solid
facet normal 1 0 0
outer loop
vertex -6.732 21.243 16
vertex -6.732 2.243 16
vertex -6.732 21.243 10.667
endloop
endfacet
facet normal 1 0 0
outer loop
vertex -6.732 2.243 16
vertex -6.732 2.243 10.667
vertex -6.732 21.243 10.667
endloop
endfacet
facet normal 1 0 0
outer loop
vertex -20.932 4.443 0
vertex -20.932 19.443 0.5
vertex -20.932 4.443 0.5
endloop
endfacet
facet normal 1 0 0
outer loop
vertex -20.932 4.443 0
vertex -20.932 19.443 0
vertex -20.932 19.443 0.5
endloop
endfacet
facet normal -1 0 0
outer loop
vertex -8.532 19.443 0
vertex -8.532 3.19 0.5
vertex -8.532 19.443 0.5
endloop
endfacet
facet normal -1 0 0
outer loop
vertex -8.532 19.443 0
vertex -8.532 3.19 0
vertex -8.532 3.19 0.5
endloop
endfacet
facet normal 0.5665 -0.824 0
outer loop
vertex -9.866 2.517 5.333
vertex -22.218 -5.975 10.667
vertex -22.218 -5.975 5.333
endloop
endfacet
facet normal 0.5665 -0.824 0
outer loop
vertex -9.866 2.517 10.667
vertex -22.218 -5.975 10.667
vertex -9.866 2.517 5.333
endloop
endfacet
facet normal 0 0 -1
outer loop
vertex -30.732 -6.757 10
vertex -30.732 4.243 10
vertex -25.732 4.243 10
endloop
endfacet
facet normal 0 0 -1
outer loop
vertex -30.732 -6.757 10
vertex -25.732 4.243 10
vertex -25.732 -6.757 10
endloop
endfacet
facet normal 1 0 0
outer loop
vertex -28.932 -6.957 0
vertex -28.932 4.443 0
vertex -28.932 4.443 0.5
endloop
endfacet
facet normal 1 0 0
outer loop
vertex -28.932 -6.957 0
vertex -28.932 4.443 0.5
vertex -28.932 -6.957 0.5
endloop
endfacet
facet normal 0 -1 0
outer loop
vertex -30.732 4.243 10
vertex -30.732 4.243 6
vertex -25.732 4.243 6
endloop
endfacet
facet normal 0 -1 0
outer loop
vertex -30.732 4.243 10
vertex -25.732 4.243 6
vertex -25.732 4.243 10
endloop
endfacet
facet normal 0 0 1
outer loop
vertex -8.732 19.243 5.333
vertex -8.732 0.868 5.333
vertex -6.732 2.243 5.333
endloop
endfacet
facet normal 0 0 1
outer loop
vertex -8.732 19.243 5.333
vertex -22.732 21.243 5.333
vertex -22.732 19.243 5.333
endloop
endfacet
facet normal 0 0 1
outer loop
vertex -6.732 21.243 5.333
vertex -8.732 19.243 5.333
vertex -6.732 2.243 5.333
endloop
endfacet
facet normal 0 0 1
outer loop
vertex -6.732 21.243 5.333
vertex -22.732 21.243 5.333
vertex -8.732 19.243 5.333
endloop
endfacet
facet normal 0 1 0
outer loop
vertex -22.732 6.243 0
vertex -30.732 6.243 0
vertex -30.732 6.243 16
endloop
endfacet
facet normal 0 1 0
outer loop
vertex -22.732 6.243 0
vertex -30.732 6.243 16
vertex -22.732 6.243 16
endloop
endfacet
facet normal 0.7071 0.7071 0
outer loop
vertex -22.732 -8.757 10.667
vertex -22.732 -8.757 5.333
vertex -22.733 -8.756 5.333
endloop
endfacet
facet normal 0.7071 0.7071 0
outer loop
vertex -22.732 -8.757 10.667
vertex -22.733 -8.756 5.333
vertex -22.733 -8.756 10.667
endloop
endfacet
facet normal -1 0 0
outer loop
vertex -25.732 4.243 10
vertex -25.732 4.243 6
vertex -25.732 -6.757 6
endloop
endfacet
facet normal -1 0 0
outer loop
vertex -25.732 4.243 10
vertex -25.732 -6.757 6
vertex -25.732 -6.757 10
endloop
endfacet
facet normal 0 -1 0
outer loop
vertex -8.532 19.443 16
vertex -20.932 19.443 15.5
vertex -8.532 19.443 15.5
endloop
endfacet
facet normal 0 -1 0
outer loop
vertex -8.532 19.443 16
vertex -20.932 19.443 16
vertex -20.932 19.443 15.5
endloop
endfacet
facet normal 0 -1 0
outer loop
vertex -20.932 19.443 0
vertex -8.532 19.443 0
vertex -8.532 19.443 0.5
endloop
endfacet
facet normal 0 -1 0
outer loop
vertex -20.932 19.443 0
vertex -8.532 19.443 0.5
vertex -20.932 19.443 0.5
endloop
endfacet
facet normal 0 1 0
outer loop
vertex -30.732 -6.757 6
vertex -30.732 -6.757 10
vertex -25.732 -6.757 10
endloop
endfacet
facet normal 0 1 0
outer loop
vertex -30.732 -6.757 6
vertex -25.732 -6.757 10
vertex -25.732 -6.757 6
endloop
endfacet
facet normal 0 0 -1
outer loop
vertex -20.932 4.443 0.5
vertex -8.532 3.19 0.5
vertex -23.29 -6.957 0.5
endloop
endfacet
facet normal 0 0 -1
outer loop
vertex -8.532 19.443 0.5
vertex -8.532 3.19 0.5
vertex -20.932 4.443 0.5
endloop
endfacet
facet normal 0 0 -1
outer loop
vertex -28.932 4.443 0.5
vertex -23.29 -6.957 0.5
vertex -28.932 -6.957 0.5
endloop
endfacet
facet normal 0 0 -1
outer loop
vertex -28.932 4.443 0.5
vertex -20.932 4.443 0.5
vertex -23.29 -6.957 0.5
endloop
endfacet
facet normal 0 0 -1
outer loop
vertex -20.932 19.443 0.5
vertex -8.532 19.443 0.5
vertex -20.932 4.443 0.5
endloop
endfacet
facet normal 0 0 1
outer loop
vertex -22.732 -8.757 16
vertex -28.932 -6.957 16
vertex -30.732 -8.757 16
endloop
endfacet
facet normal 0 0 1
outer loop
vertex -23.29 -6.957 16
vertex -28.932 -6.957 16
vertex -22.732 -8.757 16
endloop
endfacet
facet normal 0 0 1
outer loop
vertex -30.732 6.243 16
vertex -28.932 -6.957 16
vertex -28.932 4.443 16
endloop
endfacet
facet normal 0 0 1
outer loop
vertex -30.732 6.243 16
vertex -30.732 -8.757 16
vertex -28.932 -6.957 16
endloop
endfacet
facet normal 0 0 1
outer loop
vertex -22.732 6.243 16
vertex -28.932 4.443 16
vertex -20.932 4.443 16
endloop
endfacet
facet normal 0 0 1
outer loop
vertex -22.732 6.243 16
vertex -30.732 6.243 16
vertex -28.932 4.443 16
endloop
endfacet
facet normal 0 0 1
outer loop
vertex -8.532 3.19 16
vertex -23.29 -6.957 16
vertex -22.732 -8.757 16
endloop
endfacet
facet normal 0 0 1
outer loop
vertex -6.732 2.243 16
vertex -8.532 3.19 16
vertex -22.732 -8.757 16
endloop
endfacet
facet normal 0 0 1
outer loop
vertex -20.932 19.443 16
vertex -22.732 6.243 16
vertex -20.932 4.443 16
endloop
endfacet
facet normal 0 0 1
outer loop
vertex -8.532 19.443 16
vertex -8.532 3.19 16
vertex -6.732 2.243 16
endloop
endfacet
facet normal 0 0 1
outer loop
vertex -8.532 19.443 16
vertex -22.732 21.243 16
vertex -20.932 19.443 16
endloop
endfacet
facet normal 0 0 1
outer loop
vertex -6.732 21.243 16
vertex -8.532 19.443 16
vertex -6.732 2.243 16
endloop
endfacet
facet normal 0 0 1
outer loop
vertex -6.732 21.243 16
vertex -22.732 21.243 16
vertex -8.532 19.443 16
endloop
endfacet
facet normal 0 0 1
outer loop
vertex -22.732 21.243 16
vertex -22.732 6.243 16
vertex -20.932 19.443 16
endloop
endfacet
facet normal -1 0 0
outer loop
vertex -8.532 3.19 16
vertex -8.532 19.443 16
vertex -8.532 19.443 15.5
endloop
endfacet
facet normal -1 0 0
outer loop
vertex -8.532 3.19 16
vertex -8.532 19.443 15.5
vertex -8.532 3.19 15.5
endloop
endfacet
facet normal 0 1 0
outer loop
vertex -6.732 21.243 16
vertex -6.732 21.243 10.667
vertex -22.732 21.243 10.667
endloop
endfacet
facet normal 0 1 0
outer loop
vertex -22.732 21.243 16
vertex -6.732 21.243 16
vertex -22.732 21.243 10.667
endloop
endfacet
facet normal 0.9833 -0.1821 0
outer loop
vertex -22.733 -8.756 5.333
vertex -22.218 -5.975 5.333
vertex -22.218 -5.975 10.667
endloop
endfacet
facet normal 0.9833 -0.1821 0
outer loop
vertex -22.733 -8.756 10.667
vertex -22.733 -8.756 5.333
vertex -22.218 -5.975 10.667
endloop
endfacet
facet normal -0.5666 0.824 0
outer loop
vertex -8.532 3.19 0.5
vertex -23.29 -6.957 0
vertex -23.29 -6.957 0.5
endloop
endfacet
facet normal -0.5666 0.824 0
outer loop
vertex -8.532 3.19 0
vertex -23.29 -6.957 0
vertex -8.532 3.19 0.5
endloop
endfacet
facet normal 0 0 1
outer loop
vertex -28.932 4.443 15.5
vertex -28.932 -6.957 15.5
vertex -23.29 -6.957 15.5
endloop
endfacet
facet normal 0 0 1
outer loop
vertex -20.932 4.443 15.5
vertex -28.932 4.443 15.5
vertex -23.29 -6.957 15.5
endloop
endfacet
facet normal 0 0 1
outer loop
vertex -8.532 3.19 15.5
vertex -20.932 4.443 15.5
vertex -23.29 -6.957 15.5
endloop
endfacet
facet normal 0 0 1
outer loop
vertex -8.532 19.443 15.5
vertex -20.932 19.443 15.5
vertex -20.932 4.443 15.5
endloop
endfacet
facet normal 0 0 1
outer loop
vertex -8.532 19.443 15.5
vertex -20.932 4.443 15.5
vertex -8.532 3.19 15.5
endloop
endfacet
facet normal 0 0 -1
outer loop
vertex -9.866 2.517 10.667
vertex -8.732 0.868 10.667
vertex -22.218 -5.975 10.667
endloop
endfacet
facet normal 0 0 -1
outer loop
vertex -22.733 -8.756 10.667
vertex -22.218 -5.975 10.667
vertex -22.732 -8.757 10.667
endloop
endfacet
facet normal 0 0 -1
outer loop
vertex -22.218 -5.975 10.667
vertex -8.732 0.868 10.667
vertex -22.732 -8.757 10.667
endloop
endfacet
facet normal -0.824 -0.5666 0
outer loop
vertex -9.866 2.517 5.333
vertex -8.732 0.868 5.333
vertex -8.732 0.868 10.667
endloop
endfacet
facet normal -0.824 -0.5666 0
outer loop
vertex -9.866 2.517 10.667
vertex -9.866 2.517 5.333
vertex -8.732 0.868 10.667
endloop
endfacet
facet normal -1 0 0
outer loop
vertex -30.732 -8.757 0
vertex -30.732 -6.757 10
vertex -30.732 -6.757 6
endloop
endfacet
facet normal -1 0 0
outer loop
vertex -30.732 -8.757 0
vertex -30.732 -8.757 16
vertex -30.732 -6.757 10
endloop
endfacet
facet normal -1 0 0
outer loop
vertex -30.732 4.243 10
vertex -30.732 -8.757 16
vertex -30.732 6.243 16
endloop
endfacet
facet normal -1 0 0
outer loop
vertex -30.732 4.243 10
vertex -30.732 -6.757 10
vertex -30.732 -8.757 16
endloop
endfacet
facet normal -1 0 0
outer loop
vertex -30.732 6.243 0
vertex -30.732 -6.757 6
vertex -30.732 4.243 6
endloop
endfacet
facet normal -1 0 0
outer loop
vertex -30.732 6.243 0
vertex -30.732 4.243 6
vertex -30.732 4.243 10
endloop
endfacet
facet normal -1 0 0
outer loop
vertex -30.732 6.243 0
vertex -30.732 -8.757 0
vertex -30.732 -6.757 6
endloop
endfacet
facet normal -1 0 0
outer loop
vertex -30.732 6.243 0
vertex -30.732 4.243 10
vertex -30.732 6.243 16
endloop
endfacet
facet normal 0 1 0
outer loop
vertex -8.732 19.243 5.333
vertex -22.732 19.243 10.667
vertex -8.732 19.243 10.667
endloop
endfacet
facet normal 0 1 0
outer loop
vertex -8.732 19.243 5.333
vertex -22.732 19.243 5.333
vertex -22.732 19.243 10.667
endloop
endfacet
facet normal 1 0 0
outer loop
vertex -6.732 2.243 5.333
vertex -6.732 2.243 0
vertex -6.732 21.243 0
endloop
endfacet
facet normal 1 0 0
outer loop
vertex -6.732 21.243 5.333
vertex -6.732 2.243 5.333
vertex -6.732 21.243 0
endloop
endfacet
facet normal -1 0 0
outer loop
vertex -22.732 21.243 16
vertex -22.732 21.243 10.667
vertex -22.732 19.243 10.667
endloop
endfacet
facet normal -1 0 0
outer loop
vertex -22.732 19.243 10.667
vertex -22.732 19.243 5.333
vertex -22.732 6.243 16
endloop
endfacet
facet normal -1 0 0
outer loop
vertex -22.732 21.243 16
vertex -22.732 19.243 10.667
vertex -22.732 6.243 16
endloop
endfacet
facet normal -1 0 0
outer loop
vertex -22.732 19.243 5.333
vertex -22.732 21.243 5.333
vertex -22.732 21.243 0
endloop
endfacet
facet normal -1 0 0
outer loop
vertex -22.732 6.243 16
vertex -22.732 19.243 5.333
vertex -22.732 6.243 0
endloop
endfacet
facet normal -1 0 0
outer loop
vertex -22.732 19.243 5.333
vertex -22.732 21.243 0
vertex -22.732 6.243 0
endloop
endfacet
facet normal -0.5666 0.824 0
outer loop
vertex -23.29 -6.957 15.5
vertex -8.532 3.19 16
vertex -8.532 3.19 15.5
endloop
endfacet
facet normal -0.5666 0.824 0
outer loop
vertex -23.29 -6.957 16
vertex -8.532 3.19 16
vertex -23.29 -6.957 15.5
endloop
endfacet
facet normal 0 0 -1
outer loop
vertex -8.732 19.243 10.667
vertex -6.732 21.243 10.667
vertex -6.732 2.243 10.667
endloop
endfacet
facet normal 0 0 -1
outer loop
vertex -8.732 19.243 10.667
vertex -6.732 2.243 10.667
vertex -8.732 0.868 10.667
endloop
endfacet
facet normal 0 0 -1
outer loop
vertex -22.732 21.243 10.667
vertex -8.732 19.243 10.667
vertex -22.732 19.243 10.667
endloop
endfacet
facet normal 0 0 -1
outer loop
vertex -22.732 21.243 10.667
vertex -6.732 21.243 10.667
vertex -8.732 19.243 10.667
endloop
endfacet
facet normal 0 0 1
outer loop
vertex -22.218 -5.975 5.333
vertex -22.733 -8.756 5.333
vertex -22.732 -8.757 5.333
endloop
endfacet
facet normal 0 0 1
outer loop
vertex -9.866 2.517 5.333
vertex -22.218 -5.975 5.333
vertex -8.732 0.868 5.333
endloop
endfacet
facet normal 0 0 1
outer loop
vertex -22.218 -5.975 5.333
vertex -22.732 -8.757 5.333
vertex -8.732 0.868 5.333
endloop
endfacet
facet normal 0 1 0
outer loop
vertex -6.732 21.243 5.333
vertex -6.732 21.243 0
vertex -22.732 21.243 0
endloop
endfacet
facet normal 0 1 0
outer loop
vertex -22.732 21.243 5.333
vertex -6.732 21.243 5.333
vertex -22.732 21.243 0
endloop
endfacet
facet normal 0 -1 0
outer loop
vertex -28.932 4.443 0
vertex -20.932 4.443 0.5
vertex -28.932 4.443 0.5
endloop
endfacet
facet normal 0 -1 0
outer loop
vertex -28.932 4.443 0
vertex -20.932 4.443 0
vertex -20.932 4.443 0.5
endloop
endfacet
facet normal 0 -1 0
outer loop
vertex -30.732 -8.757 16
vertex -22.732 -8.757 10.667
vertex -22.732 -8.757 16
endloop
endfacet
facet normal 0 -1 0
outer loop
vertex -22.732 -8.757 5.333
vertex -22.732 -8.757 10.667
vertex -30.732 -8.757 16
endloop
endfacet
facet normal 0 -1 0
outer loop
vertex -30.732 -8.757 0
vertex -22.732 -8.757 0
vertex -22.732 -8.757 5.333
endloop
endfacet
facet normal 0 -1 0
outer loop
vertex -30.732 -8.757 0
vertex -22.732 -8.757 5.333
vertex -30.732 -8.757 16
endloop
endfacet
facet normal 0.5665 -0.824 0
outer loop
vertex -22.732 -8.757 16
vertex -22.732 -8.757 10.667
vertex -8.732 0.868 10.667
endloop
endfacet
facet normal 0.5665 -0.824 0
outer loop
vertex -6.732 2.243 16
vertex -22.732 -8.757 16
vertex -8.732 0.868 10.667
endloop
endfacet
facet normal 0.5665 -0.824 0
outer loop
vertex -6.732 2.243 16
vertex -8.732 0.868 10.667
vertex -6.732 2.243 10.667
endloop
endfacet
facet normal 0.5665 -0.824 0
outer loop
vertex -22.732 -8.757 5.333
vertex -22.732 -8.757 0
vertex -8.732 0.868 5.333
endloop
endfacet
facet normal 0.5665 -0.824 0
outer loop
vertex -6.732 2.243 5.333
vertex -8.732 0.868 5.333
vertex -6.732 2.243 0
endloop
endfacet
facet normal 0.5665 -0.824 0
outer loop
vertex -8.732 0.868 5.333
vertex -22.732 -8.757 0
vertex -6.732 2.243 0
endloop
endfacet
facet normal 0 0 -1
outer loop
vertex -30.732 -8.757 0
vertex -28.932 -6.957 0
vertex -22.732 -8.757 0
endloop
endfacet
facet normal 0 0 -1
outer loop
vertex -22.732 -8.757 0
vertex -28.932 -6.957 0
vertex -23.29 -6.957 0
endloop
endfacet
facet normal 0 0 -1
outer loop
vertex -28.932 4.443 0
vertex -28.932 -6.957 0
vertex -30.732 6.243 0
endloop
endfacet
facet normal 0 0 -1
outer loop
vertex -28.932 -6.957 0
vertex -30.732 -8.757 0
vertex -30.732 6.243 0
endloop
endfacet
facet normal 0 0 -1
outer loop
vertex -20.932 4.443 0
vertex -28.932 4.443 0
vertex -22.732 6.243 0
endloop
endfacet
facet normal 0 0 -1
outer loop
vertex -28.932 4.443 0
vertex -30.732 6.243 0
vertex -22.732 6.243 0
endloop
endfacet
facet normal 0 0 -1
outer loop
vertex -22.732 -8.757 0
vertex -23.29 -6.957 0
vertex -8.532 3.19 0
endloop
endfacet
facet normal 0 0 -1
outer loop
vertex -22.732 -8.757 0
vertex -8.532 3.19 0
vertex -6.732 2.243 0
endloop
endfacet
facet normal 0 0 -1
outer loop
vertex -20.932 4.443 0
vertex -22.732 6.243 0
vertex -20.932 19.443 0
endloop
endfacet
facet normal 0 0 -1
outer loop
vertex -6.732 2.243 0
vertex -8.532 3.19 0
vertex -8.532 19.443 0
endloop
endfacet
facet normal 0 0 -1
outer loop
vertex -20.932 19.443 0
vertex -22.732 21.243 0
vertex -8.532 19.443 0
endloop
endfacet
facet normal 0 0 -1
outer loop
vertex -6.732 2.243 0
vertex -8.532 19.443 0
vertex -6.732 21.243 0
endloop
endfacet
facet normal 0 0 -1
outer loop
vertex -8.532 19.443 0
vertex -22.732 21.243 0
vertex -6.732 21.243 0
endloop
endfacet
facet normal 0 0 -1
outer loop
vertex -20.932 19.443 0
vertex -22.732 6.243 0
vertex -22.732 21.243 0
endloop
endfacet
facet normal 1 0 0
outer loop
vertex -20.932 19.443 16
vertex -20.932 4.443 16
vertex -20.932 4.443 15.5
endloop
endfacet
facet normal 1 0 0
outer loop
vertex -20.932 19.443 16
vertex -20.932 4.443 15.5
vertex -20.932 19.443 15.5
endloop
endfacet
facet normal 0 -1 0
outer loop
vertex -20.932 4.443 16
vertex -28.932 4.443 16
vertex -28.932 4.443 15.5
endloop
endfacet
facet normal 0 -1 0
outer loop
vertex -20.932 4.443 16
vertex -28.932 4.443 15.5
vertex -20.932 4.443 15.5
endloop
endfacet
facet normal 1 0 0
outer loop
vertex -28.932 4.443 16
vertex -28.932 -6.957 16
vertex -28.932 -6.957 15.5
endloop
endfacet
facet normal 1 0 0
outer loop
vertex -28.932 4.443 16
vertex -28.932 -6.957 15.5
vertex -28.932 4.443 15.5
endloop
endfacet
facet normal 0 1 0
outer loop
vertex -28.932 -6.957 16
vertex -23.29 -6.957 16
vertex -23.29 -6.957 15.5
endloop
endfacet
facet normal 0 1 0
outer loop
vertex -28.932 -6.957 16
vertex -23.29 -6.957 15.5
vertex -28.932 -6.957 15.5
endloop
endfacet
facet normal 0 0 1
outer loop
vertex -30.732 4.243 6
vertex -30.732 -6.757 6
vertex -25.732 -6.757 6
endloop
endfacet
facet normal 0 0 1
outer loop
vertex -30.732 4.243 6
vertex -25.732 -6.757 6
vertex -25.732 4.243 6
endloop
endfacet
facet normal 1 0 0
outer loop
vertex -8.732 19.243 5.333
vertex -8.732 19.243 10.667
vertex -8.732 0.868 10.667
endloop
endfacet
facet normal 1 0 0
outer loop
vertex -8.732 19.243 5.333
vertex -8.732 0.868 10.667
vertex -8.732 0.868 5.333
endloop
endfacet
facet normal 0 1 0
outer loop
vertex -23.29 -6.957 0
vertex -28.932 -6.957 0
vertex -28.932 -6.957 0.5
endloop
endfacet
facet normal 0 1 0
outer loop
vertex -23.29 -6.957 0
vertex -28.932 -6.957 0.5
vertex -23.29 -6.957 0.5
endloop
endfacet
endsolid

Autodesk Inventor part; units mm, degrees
ref_plane "YZ Plane" through (0, 0, 0) normal (1, 0, 0) x (0, 1, 0)
ref_plane "XZ Plane" through (0, 0, 0) normal (0, 1, 0) x (-1, 0, 0)
ref_plane "XY Plane" through (0, 0, 0) normal (0, 0, 1) x (1, 0, 0)
sketch "Sketch1" plane through (0, 0, 0) normal (0, 0, 1) x (1, 0, 0)
  line L0 (-30.7315, 6.2426) -> (-22.7315, 6.2426)
  line L1 (-22.7315, 6.2426) -> (-22.7315, -8.7574)
  line L2 (-22.7315, -8.7574) -> (-30.7315, -8.7574)
  line L3 (-30.7315, -8.7574) -> (-30.7315, 6.2426)
  line L4 (-6.7315, 2.2426) -> (-6.7315, 21.2426)
  line L5 (-6.7315, 21.2426) -> (-22.7315, 21.2426)
  line L6 (-22.7315, 21.2426) -> (-22.7315, 6.2426)
  line L7 (-22.7315, -8.7574) -> (-6.7315, 2.2426)
  point P0 (0, 0)
  dimension "d0" = 15
  dimension "d1" = 8
  dimension "d2" = 15
  dimension "d3" = 16
  dimension "d4" = 19
extrude "Extrusion1" add sketch "Sketch1" along normal blind 16
sketch "Sketch2" plane through (-22.7315, 21.2426, 0) normal (0, 1, 0) x (1, 0, 0)
  line L0 (16, 0) -> (16, -16) projected
  line L1 (0, -5.3333) -> (16, -5.3333)
  line L2 (16, -5.3333) -> (16, -10.6667)
  line L3 (16, -10.6667) -> (0, -10.6667)
  line L4 (0, -10.6667) -> (0, -5.3333)
  line L5 (0, 0) -> (0, -16) projected
  line L6 (16, 0) -> (0, 0) projected
  line L7 (16, -16) -> (0, -16) projected
  point P0 (22.7315, 0)
  dimension "d7" = 16
  dimension "d8" = 5.3333
  dimension "d9" = 5.3333
extrude "Extrusion2" cut sketch "Sketch2" against normal blind 2 contours L0 L3 L4 L1
sketch "Sketch3" plane through (-6.7315, 2.2426, 0) normal (1, 0, 0) x (0, 0, -1)
  line L0 (-10.6667, 17) -> (-10.6667, 19) projected
  line L1 (-10.6667, 19) -> (-16, 19) projected
  line L2 (-16, 0) -> (-16, 19) projected
  line L3 (0, 0) -> (-16, 0) projected
  line L4 (0, 0) -> (0, 19) projected
  line L5 (0, 19) -> (-5.3333, 19) projected
  line L6 (-5.3333, 19) -> (-5.3333, 17) projected
  line L7 (-5.3333, 17) -> (-10.6667, 17) projected
  line L8 (0, 0) -> (-16, 0) projected
  line L9 (-10.6667, 17) -> (-5.3333, 17)
  line L10 (-10.6667, 17) -> (-10.6667, -2)
  line L11 (-10.6667, -2) -> (-5.3333, -2)
  line L12 (-5.3333, -2) -> (-5.3333, 17)
  point P0 (0, -2.2426)
  dimension "d14" = 19
  dimension "d15" = 19
extrude "Extrusion3" cut sketch "Sketch3" against normal blind 2 contours L7 L12 L3 L10 | L3 L12 L11 L10
sketch "Sketch4" plane through (-22.7315, -8.7574, 0) normal (0.5665, -0.824, 0) x (0.824, 0.5665, 0)
  line L0 (16.9894, 10.6667) -> (19.4165, 10.6667) projected
  line L1 (19.4165, 10.6667) -> (19.4165, 16) projected
  line L2 (0, 16) -> (19.4165, 16) projected
  line L3 (0, 0) -> (0, 16) projected
  line L4 (0, 0) -> (19.4165, 0) projected
  line L5 (19.4165, 0) -> (19.4165, 5.3333) projected
  line L6 (19.4165, 5.3333) -> (16.9894, 5.3333) projected
  line L7 (16.9894, 5.3333) -> (16.9894, 10.6667) projected
  line L8 (16.9894, 10.6667) -> (19.4165, 10.6667) projected
  line L9 (16.9894, 10.6667) -> (0, 10.6667)
  line L10 (0, 10.6667) -> (0, 5.3333)
  line L11 (0, 5.3333) -> (16.9894, 5.3333)
  line L12 (16.9894, 5.3333) -> (16.9894, 10.6667)
  point P0 (23.693, 0)
  dimension "d17" = 19.4165
extrude "Extrusion4" cut sketch "Sketch4" against normal blind 2 contours L7 L11 L3 L9
chamfer "Chamfer1" distance 2 angle 45 1 edges at (-23.8645, -7.1093, 8)
sketch "Sketch5" plane through (-30.7315, -8.7574, 0) normal (-1, 0, 0) x (0, 0, 1)
  line L0 (6, 13) -> (10, 13)
  line L1 (10, 13) -> (10, 2)
  line L2 (10, 2) -> (6, 2)
  line L3 (6, 2) -> (6, 13)
  line L4 (0, 15) -> (0, 0) projected
  line L5 (0, 0) -> (16, 0) projected
  line L6 (16, 15) -> (16, 0) projected
  line L7 (0, 15) -> (16, 15) projected
  point P0 (0, 8.7574)
  dimension "d23" = 4
  dimension "d24" = 11
  dimension "d25" = 6
  dimension "d26" = 15
  dimension "d27" = 16
  dimension "d28" = 2
extrude "Extrusion5" cut sketch "Sketch5" against normal blind 5 contours L0 L1 L2 L3
sketch "Sketch6" plane through (0, 0, 0) normal (0, 0, -1) x (-1, 0, 0)
  line L0 (6.7315, 2.2426) -> (6.7315, 21.2426) projected
  line L1 (22.7315, -8.7574) -> (6.7315, 2.2426) projected
  line L2 (30.7315, -8.7574) -> (22.7315, -8.7574) projected
  line L3 (30.7315, 6.2426) -> (30.7315, -8.7574) projected
  line L4 (22.7315, 6.2426) -> (30.7315, 6.2426) projected
  line L5 (22.7315, 21.2426) -> (22.7315, 6.2426) projected
  line L6 (6.7315, 21.2426) -> (22.7315, 21.2426) projected
  line L7 (20.9315, 19.4426) -> (20.9315, 4.4426)
  line L8 (20.9315, 4.4426) -> (28.9315, 4.4426)
  line L9 (28.9315, 4.4426) -> (28.9315, -6.9574)
  line L10 (28.9315, -6.9574) -> (23.2905, -6.9574)
  line L11 (23.2905, -6.9574) -> (8.5315, 3.1895)
  line L12 (8.5315, 3.1895) -> (8.5315, 19.4426)
  line L13 (8.5315, 19.4426) -> (20.9315, 19.4426)
  point P0 (0, 0)
  dimension "d31" = 1.8
extrude "Extrusion6" cut sketch "Sketch6" against normal blind 0.5 contours L7 L8 L9 L10 L11 L12 L13
sketch "Sketch7" plane through (0, 0, 16) normal (0, 0, 1) x (1, 0, 0)
  line L0 (-6.7315, 21.2426) -> (-22.7315, 21.2426) projected
  line L1 (-6.7315, 2.2426) -> (-6.7315, 21.2426) projected
  line L2 (-6.7315, 2.2426) -> (-6.7315, 21.2426) projected
  line L3 (-6.7315, 21.2426) -> (-22.7315, 21.2426) projected
  line L4 (-22.7315, 21.2426) -> (-22.7315, 6.2426) projected
  line L5 (-22.7315, 6.2426) -> (-30.7315, 6.2426) projected
  line L6 (-30.7315, 6.2426) -> (-30.7315, -8.7574) projected
  line L7 (-30.7315, -8.7574) -> (-22.7315, -8.7574) projected
  line L8 (-22.7315, -8.7574) -> (-6.7315, 2.2426) projected
  line L9 (-20.9315, 4.4426) -> (-20.9315, 19.4426)
  line L10 (-20.9315, 19.4426) -> (-8.5315, 19.4426)
  line L11 (-8.5315, 19.4426) -> (-8.5315, 3.1895)
  line L12 (-8.5315, 3.1895) -> (-23.2905, -6.9574)
  line L13 (-23.2905, -6.9574) -> (-28.9315, -6.9574)
  line L14 (-28.9315, -6.9574) -> (-28.9315, 4.4426)
  line L15 (-28.9315, 4.4426) -> (-20.9315, 4.4426)
  line L16 (-20.9315, 19.4426) -> (-20.9315, 4.4426) projected
  point P0 (0, 0)
  dimension "d34" = 0
extrude "Extrusion7" cut sketch "Sketch7" against normal blind 0.5 contours L9 L10 L11 L12 L13 L14 L15
equation "\"d8\" = 0.333333 * d7"
equation "\"d9\" = -2 * d8 + d7"
equation "\"d14\" = d15"
equation "\"d25\" = -0.5 * d23 + 0.5 * d27"
equation "\"d28\" = -0.5 * d24 + 0.5 * d26"
properties part number "under walle L3"
